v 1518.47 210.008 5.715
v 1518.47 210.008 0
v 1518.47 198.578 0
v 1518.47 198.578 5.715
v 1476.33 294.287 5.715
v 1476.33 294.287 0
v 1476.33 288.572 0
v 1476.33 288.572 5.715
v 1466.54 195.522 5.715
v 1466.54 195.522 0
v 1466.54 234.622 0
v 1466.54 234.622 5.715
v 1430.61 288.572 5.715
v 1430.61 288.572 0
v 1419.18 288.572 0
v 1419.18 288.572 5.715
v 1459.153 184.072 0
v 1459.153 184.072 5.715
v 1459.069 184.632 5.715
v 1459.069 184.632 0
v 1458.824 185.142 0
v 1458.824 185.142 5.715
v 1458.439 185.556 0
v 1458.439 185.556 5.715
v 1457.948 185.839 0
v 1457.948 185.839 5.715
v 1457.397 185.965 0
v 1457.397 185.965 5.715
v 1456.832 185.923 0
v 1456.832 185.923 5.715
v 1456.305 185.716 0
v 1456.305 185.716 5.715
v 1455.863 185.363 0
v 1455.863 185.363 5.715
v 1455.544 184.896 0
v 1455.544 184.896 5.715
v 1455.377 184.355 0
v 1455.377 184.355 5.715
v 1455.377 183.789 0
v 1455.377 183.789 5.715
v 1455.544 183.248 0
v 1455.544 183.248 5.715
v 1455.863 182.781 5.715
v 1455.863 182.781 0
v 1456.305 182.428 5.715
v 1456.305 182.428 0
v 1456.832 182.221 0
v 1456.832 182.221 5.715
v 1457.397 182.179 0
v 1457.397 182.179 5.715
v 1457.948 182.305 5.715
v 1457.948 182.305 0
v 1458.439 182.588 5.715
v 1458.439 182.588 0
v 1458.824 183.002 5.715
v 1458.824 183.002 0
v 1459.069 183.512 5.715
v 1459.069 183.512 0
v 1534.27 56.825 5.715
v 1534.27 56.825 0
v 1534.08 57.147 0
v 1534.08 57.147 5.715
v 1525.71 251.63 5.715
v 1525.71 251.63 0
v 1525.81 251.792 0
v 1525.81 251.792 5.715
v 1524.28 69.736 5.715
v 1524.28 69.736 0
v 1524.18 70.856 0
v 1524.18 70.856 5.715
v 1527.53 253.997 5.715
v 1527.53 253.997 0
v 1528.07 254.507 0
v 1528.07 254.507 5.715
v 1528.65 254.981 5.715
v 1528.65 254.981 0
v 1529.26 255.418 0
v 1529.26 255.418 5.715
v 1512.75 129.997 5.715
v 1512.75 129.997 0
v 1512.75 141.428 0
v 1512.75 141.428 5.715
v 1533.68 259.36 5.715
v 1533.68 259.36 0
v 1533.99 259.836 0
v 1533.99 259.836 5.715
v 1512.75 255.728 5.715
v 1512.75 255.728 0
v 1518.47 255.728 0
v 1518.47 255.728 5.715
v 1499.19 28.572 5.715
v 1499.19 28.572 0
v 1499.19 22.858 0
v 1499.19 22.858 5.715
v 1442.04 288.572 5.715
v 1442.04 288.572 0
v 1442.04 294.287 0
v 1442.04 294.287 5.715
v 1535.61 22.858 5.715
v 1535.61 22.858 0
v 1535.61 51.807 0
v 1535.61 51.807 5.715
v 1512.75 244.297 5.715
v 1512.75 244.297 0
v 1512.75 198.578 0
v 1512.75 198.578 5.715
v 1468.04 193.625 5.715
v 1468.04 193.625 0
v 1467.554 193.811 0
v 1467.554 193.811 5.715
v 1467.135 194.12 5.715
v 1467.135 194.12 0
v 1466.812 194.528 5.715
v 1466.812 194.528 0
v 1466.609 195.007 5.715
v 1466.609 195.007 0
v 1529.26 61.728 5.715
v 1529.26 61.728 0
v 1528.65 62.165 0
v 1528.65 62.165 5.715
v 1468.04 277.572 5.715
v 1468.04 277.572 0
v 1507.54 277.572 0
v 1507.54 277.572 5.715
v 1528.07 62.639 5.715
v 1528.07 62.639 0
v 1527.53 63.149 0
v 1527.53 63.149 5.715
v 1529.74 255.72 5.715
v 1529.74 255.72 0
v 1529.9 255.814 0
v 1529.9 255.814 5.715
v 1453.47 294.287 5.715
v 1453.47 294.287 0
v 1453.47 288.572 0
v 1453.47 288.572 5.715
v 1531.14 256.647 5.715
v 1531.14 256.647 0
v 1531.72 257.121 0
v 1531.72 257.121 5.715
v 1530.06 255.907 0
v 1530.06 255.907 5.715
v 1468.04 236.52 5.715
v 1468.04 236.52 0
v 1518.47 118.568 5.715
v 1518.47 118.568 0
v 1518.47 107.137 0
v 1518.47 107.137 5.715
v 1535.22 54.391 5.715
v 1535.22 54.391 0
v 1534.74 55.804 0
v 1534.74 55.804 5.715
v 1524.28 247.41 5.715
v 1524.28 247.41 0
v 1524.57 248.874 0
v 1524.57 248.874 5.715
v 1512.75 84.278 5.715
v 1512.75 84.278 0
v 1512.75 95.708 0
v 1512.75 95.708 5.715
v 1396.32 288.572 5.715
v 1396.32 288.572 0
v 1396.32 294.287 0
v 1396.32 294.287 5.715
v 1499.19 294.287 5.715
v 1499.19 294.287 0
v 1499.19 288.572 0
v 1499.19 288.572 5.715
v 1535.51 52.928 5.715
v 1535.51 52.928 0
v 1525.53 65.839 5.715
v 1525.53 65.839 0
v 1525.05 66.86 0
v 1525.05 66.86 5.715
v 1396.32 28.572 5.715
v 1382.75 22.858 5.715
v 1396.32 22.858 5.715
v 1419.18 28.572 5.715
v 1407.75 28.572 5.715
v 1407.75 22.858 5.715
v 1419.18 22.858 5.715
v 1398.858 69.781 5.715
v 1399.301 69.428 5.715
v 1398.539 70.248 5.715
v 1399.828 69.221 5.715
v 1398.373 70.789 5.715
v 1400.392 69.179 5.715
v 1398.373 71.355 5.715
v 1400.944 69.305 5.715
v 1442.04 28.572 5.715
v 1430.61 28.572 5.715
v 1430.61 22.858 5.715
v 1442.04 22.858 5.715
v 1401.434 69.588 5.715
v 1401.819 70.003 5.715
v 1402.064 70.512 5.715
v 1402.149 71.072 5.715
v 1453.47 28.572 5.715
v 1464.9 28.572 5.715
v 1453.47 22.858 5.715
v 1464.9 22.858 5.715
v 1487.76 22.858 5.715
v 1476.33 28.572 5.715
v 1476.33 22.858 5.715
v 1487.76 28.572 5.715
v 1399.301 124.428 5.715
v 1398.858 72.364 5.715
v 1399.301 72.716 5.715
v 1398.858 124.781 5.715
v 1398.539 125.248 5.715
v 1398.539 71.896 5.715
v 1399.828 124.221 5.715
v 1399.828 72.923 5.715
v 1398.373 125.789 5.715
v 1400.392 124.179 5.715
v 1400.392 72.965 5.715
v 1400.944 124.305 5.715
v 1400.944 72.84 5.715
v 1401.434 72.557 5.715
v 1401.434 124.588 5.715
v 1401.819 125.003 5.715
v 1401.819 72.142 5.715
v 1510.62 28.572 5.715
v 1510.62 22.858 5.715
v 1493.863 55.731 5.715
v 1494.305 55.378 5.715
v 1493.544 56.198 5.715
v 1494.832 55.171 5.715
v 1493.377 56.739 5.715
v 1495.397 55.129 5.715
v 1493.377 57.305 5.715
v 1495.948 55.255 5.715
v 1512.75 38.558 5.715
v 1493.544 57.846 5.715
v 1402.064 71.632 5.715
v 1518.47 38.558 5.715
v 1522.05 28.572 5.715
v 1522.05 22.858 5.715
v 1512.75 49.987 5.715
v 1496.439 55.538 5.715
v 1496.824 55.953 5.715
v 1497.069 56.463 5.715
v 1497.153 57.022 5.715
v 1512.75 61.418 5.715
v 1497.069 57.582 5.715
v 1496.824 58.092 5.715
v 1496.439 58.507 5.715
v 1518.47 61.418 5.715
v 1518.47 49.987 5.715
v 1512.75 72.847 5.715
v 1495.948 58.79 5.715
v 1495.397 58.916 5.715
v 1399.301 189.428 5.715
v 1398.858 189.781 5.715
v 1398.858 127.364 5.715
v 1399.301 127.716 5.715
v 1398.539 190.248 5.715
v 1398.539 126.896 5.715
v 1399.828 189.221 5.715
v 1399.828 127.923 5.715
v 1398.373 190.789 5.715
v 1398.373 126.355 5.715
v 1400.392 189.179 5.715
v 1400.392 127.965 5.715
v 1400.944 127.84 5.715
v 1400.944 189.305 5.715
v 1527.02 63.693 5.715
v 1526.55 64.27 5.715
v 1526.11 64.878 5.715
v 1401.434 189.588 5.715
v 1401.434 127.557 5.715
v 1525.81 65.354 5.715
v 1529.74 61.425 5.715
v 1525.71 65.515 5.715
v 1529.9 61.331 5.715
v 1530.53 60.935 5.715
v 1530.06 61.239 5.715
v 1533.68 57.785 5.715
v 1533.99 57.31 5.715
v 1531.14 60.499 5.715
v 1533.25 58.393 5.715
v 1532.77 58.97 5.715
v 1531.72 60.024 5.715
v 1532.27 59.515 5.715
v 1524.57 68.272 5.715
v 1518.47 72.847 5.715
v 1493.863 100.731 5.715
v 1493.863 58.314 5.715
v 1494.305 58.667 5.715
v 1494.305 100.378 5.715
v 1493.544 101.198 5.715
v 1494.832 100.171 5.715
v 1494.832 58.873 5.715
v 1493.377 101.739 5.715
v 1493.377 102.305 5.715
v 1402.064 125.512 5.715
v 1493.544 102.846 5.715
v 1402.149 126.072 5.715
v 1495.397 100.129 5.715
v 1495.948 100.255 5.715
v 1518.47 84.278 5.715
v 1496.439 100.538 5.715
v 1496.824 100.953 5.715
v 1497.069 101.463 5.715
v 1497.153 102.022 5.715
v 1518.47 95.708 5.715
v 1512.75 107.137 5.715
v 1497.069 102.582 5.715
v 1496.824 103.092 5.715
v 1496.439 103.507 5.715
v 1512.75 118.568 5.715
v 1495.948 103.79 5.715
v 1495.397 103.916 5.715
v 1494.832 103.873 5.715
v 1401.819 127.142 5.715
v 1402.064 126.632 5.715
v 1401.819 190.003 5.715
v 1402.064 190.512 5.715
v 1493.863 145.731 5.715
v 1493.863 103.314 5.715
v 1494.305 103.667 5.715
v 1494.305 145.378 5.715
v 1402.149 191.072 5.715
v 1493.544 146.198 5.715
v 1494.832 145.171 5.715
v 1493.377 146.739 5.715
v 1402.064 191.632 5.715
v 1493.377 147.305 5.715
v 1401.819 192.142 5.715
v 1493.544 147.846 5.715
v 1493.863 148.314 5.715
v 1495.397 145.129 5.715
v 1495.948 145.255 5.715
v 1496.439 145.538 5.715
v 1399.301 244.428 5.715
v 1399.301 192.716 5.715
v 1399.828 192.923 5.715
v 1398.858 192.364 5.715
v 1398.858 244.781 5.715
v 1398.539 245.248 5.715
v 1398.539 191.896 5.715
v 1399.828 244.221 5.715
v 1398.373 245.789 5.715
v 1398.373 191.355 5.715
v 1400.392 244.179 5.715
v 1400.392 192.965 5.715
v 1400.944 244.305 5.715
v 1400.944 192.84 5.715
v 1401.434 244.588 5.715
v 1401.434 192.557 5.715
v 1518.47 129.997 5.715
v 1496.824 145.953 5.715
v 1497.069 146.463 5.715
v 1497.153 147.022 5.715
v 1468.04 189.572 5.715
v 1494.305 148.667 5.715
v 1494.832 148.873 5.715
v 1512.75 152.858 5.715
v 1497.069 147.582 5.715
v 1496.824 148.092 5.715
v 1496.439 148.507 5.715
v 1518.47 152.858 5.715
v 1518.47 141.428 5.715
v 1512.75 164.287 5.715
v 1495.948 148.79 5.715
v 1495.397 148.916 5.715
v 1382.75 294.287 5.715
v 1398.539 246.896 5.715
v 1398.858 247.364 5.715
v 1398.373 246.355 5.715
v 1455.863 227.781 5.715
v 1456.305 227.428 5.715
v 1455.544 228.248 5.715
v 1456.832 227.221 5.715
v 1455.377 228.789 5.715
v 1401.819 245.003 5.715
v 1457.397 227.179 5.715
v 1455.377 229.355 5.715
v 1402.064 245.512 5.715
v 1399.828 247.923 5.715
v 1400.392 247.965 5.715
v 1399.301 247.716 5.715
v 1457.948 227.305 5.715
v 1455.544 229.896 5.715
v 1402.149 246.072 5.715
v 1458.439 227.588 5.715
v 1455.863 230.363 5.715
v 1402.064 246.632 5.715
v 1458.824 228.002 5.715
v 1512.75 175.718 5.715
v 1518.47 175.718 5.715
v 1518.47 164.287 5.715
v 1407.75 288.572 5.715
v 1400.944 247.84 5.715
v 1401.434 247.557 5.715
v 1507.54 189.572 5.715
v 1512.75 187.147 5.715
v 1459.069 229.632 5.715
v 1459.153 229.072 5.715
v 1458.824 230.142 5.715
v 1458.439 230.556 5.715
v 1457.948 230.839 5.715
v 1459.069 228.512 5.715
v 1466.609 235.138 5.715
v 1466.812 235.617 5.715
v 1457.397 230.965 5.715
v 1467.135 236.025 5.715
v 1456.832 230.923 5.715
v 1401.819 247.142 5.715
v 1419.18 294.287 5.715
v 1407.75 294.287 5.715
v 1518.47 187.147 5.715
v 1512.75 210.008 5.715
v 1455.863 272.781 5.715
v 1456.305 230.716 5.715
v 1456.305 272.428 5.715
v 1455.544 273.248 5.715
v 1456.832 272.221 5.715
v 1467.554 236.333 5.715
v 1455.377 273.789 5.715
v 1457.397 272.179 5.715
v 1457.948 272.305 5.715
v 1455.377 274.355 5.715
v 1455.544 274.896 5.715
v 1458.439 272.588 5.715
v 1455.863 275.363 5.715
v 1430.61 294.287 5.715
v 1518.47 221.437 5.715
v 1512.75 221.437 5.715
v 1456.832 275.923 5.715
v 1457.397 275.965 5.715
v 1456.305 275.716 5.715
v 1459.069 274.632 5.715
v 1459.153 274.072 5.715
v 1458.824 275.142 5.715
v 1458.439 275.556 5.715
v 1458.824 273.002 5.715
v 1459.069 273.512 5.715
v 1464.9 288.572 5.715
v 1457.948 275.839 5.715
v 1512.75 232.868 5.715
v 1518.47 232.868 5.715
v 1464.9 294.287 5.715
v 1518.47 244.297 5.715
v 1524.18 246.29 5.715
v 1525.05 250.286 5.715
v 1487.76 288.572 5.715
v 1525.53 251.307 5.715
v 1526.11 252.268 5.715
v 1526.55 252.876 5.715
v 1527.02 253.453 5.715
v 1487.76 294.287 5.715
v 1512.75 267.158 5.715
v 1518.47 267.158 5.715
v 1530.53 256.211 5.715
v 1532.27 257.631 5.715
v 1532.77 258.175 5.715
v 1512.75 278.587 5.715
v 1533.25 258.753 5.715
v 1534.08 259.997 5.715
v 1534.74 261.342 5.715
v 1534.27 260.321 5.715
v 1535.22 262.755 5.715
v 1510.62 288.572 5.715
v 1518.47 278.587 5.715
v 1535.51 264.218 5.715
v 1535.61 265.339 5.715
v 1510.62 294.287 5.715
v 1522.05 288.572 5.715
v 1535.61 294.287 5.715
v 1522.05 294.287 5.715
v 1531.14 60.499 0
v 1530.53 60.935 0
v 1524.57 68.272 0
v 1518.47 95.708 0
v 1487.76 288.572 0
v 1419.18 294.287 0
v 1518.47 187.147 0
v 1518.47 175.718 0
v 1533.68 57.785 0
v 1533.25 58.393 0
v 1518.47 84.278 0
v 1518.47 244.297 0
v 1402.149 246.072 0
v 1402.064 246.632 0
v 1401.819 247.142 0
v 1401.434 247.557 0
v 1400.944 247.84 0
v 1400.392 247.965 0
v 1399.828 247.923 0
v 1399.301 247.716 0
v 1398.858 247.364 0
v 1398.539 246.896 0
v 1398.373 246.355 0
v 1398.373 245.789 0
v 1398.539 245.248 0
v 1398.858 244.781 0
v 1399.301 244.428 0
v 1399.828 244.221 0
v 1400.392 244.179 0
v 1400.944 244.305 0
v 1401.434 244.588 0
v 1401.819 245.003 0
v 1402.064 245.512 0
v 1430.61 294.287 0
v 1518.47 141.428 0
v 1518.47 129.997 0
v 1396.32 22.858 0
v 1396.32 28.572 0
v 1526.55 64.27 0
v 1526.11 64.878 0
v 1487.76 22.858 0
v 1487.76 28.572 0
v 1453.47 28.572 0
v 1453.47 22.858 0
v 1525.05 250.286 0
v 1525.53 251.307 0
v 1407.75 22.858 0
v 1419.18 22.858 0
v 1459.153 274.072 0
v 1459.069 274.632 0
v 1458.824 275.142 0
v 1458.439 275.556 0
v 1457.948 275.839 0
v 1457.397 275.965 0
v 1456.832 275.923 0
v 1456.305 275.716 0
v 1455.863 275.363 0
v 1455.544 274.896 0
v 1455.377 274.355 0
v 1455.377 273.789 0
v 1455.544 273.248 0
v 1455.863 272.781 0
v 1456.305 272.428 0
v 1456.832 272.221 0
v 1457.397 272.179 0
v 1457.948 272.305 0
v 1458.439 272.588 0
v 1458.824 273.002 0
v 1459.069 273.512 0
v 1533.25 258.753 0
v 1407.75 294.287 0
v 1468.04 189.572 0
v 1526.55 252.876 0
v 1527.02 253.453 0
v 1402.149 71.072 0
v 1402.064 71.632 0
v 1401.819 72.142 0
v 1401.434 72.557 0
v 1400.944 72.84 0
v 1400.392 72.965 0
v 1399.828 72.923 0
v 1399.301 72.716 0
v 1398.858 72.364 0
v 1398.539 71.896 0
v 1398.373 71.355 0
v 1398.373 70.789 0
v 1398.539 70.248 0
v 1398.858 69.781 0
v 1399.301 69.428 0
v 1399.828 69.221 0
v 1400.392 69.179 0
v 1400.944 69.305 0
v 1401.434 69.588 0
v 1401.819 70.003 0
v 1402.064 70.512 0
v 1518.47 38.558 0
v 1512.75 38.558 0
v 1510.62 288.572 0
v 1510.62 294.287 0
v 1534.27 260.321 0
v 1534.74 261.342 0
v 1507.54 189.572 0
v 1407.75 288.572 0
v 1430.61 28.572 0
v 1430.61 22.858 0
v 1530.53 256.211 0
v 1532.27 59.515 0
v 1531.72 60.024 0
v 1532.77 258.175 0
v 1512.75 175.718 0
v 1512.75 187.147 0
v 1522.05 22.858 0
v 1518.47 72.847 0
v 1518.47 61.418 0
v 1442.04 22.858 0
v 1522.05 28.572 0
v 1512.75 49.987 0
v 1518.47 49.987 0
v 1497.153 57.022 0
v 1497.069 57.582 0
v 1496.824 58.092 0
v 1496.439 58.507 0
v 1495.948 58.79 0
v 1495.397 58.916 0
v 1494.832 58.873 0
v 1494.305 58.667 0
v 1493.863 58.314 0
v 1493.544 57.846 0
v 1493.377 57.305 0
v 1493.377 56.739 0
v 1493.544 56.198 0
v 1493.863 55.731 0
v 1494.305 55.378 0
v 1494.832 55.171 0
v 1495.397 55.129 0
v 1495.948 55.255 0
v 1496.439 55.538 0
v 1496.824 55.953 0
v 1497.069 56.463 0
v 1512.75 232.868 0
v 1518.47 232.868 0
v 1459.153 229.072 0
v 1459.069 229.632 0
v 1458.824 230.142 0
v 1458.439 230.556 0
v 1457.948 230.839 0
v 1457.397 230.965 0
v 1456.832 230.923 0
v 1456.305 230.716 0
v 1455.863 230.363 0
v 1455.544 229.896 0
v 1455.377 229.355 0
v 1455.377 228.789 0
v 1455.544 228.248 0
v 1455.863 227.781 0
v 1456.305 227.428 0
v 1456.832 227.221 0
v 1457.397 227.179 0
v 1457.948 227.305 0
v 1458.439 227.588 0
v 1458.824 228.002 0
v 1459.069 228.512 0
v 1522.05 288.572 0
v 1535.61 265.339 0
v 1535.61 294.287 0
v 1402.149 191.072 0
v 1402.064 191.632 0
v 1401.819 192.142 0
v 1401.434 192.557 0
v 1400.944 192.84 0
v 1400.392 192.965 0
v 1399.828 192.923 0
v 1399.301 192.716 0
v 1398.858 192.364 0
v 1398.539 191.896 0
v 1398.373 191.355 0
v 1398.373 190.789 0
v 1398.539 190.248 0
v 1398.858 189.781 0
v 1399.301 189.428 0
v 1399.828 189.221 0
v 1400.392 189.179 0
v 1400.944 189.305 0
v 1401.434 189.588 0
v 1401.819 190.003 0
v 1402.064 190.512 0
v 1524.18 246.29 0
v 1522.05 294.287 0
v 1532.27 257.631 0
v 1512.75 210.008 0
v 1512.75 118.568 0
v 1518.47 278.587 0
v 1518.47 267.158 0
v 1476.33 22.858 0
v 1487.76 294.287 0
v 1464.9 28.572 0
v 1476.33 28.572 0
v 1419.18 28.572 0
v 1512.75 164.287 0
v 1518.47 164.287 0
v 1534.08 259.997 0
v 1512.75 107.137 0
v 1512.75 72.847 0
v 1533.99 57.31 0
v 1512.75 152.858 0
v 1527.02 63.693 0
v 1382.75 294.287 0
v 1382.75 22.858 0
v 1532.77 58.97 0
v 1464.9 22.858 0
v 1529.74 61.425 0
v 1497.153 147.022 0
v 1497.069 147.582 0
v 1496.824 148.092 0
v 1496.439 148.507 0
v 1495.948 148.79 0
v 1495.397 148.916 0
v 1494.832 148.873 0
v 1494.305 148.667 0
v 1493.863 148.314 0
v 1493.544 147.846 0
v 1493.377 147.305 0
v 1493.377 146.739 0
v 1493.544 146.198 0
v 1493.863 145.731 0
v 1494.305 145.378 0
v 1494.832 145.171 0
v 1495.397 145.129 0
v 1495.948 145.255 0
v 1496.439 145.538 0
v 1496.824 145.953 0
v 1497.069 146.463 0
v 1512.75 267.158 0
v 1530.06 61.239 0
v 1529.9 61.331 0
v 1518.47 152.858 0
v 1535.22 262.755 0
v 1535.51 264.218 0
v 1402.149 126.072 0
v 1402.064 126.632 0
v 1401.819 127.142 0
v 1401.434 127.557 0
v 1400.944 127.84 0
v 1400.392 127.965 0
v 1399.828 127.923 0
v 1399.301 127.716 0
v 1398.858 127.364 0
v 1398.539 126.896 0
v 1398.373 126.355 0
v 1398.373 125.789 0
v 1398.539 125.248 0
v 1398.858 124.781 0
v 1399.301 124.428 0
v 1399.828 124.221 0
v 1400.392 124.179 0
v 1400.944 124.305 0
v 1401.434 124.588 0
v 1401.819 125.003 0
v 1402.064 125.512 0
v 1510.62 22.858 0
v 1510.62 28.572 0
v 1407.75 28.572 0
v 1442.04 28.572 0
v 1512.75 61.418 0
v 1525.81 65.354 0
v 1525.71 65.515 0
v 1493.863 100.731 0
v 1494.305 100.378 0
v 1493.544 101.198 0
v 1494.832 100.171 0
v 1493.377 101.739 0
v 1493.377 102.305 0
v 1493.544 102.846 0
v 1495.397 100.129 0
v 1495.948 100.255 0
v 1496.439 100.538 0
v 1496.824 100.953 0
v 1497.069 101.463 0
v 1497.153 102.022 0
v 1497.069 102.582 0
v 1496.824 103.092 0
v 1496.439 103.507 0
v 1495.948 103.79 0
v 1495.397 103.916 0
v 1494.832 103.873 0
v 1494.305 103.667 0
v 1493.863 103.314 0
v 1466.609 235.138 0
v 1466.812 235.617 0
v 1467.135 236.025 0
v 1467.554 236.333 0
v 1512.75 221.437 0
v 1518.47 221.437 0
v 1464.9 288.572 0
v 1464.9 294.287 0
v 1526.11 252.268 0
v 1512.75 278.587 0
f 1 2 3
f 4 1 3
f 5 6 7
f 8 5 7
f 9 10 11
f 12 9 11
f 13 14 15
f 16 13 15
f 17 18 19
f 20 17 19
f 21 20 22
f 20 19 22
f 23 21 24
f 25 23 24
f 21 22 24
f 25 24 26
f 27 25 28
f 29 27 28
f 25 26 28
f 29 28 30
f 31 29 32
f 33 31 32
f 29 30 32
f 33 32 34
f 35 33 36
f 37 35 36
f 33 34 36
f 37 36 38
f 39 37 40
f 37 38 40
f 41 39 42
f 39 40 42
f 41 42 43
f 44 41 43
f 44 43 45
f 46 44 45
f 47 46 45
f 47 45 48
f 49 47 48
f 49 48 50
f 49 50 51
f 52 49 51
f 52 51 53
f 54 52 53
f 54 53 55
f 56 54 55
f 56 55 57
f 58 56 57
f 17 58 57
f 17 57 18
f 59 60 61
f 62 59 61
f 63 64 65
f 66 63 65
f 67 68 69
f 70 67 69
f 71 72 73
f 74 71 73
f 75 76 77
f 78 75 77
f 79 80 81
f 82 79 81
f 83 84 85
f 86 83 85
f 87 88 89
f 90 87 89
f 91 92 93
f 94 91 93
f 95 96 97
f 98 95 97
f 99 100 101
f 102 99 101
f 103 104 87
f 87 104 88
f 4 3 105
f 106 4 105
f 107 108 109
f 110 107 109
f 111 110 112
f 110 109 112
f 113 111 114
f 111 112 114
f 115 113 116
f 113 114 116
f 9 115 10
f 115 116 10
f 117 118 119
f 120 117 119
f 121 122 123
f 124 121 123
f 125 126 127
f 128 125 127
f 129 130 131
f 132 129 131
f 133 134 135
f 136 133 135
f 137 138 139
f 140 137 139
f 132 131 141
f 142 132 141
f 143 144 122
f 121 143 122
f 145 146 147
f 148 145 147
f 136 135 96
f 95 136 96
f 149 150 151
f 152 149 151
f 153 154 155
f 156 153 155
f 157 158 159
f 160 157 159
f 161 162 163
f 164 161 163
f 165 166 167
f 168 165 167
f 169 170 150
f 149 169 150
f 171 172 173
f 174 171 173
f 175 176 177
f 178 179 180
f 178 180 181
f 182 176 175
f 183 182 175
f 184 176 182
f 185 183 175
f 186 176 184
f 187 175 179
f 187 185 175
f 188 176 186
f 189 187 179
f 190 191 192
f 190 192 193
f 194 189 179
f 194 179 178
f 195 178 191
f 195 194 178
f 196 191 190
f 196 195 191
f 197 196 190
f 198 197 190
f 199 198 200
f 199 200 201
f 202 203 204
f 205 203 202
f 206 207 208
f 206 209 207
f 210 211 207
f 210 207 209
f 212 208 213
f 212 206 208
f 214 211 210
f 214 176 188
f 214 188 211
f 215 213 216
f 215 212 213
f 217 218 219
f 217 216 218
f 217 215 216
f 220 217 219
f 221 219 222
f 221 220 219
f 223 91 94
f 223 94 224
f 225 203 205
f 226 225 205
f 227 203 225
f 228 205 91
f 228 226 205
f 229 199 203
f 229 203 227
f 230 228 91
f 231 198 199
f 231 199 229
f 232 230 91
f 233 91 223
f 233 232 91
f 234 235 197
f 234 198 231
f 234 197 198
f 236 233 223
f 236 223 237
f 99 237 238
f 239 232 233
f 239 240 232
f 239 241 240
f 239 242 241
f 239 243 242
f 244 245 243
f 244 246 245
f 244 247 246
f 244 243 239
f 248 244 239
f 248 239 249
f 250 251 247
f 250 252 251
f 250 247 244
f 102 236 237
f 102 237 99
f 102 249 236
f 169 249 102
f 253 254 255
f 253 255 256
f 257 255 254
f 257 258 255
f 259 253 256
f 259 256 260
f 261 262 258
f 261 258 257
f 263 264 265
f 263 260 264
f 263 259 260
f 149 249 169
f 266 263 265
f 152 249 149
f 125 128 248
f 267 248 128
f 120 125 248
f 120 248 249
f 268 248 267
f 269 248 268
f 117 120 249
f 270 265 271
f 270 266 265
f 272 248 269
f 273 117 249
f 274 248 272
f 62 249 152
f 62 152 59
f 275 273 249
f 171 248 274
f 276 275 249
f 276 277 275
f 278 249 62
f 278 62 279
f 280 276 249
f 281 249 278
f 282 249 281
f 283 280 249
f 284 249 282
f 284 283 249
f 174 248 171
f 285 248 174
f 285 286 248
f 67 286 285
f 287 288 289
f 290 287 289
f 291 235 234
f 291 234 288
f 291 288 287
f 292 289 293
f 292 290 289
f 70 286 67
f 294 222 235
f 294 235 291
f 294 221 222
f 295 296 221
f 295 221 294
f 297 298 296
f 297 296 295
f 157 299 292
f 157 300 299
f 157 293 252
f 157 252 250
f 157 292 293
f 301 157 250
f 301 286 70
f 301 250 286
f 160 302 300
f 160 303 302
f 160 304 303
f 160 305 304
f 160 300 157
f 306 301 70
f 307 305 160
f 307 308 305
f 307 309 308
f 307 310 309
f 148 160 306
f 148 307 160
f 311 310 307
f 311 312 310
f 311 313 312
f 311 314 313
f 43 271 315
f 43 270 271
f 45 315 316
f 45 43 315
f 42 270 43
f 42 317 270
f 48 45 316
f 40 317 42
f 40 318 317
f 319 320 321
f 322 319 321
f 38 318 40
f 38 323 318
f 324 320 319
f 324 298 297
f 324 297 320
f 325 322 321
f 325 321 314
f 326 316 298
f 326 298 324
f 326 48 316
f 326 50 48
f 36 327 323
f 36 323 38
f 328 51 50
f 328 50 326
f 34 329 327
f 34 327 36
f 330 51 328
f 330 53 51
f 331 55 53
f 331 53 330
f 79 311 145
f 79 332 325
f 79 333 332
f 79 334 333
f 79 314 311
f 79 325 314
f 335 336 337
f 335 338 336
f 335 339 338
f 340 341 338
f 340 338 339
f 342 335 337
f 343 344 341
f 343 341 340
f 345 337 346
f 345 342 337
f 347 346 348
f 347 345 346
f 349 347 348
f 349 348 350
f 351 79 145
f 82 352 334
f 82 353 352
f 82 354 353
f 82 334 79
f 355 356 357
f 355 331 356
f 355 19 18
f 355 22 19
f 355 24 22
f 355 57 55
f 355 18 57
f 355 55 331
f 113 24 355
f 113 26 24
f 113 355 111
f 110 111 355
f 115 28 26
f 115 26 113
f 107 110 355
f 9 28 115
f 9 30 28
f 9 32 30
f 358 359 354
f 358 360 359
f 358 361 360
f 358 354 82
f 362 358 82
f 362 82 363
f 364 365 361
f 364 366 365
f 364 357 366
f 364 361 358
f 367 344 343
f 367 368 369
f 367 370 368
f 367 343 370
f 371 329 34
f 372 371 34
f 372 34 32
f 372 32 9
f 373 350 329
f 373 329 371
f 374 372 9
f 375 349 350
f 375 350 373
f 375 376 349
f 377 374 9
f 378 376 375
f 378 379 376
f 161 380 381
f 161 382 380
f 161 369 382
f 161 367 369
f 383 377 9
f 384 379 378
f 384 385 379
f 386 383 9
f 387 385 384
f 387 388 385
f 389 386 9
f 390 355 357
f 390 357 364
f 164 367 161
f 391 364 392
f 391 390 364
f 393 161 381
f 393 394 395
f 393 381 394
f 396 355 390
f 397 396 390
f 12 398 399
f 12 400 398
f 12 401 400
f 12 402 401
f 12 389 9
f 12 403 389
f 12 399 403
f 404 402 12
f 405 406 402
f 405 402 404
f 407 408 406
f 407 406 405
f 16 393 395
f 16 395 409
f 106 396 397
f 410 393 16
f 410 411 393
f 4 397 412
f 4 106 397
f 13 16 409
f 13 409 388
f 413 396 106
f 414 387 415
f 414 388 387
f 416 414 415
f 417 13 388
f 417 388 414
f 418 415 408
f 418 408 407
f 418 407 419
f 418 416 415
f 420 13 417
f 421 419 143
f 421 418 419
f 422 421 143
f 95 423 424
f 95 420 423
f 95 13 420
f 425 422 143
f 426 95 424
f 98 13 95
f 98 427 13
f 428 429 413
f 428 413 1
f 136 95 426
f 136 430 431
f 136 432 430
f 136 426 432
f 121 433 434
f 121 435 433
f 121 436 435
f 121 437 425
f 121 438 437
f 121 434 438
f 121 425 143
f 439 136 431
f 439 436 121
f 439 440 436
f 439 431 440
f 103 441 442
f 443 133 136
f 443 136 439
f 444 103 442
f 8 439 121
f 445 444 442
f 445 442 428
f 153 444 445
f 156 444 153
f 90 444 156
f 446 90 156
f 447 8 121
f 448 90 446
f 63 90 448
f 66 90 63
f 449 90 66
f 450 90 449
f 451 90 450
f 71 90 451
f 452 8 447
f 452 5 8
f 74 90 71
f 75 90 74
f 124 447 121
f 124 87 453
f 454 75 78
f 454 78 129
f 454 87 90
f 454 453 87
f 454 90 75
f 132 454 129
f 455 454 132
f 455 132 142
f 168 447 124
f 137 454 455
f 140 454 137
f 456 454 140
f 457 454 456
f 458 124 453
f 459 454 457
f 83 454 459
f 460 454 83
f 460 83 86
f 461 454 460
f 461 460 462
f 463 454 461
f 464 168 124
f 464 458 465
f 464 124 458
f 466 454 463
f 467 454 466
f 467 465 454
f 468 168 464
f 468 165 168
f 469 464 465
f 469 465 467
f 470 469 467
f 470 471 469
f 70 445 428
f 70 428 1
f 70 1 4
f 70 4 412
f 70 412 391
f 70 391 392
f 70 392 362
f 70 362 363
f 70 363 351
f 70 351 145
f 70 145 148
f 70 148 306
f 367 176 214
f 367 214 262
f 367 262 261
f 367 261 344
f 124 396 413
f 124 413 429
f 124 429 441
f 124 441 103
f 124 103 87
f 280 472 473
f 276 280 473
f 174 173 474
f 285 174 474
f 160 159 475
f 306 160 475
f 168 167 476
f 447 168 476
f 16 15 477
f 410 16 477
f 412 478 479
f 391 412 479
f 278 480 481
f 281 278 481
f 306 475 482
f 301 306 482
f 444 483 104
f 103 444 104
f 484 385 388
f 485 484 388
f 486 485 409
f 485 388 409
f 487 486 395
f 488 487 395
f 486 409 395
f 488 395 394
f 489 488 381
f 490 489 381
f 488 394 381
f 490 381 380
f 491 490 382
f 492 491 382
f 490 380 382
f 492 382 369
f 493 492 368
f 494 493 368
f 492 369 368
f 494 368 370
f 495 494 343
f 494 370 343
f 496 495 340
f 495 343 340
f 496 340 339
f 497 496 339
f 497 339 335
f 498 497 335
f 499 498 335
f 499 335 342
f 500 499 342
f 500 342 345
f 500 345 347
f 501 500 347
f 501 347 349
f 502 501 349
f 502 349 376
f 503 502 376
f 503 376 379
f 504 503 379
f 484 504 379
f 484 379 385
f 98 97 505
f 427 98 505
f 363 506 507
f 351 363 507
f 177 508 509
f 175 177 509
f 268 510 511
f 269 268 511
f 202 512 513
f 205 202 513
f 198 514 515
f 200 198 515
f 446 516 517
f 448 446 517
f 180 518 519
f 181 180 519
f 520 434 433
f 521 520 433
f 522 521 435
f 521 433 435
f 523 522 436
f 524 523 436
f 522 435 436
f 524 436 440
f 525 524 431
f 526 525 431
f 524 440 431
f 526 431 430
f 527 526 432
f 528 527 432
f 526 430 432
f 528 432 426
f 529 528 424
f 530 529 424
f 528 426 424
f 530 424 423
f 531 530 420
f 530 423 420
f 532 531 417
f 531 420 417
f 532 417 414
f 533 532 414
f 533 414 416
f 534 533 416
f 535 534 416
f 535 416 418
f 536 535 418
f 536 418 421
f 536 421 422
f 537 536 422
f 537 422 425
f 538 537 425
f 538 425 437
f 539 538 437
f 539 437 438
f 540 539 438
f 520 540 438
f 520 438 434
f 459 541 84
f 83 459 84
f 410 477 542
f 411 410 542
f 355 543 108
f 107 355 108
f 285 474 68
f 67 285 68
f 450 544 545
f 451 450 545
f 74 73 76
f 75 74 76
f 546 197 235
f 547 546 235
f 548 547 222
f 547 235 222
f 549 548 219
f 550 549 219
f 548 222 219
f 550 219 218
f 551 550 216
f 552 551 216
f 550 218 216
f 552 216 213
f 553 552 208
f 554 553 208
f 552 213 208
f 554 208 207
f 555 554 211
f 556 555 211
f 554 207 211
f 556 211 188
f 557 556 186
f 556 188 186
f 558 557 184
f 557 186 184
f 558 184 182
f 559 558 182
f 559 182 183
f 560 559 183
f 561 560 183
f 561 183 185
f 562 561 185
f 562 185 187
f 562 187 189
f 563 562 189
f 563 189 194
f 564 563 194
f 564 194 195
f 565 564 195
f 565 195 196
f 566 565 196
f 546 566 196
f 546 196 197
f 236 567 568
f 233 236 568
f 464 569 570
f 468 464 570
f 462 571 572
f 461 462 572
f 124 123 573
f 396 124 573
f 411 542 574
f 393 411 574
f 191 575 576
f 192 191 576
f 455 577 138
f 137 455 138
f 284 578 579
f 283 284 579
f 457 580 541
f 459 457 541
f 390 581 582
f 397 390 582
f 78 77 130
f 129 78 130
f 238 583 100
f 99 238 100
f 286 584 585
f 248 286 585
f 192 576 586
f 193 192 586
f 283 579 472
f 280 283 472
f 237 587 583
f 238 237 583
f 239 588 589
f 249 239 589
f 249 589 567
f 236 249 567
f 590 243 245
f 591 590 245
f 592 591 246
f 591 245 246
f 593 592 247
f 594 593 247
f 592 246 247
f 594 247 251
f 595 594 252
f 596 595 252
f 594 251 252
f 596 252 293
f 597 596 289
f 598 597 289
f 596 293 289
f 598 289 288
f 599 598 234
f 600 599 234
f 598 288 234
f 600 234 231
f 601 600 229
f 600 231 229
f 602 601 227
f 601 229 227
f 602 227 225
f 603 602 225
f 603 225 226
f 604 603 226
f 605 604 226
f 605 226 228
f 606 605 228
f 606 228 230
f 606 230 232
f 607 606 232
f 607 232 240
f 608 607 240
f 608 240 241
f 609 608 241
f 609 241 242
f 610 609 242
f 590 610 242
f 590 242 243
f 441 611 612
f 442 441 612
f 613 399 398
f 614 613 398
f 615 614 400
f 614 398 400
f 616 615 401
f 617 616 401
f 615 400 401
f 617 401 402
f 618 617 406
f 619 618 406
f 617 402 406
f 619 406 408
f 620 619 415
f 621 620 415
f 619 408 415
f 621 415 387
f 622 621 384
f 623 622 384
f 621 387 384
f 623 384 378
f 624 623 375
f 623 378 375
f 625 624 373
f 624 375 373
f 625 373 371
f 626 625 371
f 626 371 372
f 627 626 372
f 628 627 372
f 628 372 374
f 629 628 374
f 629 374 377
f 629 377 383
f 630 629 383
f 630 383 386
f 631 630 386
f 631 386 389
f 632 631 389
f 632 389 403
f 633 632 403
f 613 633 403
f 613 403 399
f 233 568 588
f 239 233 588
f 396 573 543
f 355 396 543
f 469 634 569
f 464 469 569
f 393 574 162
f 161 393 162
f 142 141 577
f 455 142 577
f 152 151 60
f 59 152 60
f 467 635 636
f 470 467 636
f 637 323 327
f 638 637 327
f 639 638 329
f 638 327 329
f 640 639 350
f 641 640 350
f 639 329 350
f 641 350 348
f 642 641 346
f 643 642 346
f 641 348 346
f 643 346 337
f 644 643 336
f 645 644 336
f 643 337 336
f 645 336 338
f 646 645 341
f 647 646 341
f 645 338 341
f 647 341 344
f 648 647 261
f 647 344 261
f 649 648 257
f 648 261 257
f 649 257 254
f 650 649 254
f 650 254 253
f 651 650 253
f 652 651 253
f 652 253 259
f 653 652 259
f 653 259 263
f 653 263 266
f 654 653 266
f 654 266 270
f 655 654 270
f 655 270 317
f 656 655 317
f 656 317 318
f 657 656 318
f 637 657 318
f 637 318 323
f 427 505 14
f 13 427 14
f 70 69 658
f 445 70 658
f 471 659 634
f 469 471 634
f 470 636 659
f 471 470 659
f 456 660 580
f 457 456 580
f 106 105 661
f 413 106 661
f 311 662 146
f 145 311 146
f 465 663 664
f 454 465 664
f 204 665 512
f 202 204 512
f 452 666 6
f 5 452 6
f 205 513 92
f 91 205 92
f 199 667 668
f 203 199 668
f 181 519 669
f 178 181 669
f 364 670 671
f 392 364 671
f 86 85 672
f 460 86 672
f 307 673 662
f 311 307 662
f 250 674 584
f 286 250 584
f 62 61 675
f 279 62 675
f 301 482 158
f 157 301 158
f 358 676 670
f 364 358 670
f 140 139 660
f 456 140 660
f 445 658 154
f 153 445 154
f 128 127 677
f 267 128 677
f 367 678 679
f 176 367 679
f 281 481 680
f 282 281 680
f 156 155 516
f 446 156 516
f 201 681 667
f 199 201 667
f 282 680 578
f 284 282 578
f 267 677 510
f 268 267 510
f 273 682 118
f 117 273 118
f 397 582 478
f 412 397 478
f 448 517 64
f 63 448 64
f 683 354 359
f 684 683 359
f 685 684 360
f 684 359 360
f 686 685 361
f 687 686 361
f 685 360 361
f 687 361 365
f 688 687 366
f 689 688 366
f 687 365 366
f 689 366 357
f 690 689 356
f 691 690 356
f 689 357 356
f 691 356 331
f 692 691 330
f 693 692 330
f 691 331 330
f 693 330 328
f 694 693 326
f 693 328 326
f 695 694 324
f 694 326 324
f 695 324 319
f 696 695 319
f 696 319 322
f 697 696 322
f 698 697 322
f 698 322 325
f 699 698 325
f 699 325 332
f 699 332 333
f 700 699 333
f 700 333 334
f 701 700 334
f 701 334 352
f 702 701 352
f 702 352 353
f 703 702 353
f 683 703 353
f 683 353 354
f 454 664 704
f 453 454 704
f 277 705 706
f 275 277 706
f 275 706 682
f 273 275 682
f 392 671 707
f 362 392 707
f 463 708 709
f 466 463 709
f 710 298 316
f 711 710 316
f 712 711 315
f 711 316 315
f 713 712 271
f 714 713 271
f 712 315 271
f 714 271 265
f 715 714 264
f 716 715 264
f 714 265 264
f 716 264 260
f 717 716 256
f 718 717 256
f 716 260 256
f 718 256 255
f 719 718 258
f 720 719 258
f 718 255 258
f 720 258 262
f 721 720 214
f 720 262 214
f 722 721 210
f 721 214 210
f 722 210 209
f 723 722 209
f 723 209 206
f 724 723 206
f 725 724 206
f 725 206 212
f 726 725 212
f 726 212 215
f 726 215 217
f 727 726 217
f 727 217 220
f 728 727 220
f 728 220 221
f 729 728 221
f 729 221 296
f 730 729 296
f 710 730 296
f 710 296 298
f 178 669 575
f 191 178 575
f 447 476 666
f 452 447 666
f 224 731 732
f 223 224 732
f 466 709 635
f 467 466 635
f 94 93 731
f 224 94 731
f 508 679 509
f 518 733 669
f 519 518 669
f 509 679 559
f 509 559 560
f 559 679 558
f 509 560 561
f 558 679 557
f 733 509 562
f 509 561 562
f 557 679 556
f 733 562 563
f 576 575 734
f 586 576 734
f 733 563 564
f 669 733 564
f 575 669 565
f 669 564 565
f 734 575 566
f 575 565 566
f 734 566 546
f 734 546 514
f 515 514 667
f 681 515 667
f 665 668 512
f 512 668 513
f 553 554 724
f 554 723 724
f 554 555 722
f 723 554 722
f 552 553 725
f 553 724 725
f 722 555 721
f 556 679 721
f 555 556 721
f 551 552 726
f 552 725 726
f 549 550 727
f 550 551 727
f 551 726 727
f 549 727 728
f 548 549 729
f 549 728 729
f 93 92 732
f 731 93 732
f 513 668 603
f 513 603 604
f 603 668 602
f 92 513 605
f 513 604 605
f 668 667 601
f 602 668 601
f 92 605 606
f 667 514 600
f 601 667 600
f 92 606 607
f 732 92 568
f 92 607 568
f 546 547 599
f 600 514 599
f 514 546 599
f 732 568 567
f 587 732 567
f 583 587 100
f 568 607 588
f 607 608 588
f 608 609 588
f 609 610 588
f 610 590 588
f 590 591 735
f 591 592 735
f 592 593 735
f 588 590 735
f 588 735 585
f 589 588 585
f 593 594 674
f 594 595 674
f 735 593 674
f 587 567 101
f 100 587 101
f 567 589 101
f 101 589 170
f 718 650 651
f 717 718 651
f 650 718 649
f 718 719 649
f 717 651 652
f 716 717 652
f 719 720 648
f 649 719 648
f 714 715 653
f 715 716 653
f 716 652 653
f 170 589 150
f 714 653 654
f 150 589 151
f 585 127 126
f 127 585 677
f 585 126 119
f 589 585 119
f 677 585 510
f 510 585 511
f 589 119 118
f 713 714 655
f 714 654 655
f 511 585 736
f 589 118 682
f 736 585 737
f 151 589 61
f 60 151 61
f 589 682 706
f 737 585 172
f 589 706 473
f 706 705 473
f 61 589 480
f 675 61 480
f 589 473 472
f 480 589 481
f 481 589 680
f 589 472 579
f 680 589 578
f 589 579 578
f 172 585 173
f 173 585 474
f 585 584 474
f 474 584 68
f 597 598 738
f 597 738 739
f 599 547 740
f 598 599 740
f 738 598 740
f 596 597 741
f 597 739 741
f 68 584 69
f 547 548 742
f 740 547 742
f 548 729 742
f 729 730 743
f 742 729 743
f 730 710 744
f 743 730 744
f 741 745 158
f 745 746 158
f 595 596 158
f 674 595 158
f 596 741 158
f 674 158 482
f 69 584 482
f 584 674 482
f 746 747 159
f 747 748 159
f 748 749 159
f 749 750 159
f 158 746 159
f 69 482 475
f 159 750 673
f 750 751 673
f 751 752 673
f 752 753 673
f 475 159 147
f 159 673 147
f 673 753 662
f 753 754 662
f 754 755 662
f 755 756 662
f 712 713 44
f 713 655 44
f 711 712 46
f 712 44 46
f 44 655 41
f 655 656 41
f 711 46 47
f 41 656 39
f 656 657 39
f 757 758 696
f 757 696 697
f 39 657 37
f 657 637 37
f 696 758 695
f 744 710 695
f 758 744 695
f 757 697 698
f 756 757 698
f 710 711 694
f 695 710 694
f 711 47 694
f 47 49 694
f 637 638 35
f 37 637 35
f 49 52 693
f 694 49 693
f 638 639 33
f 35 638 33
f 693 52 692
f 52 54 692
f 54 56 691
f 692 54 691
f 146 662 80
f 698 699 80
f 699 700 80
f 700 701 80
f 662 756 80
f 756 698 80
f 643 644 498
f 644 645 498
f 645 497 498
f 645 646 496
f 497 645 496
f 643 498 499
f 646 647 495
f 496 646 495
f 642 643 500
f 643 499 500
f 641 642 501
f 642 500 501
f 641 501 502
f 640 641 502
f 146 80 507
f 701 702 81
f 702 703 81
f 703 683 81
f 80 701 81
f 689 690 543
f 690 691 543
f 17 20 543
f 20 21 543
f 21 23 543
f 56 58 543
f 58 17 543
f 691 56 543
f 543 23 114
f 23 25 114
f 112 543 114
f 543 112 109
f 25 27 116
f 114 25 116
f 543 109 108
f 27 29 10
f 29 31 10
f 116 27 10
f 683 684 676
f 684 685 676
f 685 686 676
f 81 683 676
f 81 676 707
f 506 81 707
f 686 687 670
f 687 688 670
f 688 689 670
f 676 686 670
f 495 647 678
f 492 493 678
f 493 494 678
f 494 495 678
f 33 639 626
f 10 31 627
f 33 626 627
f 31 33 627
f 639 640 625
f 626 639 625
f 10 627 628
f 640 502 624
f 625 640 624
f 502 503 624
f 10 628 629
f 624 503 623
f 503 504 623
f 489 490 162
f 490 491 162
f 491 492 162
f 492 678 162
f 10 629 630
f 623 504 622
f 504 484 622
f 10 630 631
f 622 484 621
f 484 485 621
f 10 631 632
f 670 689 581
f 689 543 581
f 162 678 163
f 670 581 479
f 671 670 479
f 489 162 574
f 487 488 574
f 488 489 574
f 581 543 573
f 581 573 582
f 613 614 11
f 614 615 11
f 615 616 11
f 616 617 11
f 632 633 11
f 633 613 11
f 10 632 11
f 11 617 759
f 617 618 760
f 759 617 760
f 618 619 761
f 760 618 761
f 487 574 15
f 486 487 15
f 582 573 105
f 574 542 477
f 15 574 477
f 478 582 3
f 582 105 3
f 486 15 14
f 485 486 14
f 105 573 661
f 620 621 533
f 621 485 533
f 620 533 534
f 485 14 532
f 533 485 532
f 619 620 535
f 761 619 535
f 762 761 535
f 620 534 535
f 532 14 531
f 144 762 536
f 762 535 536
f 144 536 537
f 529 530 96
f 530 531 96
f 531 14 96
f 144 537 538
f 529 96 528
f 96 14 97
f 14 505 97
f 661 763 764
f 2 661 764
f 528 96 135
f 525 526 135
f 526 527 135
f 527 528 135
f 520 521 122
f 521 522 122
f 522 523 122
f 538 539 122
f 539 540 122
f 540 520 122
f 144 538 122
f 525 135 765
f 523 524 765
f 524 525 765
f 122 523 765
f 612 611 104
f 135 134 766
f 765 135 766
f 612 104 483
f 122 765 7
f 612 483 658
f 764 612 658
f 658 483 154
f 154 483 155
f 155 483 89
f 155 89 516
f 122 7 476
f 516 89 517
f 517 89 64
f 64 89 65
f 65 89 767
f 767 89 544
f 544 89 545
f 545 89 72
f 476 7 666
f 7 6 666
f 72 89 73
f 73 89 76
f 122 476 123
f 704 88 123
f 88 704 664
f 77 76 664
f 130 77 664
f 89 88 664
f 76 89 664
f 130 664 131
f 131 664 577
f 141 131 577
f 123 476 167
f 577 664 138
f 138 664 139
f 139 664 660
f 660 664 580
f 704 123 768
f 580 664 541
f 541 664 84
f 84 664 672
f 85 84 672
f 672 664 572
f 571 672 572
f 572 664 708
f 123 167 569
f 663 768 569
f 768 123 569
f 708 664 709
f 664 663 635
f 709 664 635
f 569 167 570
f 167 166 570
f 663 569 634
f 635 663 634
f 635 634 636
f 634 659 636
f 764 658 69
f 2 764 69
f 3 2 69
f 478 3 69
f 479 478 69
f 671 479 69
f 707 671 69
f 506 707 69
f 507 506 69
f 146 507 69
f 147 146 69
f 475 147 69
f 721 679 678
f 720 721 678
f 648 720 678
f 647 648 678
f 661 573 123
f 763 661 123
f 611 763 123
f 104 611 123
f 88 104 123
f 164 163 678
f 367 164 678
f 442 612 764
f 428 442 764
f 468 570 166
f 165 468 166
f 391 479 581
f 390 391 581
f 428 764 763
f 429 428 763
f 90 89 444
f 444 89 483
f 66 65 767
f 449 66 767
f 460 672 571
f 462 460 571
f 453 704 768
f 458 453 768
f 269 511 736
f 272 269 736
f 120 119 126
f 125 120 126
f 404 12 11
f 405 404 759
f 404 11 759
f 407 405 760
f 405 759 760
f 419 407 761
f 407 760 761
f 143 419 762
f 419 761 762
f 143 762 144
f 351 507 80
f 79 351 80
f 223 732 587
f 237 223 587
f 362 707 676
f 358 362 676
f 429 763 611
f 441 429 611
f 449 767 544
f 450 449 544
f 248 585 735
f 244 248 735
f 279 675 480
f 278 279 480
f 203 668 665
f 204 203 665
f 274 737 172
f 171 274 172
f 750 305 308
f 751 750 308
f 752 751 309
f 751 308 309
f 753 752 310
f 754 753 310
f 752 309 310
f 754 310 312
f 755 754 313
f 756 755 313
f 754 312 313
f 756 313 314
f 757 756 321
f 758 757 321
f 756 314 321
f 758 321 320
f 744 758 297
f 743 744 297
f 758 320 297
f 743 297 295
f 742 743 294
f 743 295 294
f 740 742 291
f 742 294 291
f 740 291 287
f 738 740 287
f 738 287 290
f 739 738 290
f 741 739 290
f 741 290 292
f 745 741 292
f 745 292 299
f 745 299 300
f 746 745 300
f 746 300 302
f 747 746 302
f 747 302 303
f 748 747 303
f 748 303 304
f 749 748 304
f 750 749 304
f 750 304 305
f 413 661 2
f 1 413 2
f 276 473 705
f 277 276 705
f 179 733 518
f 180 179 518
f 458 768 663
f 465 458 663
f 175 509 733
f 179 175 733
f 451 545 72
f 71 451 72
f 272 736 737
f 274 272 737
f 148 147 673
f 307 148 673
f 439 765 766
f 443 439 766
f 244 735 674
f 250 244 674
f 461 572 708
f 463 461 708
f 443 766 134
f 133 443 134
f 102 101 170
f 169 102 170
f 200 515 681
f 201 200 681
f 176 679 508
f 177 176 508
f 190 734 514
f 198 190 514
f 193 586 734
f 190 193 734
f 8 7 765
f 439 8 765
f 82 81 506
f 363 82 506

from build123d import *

# Parameters (mm, degrees)
BOSS_EXTRUDE1_DEPTH   = 5.715
CUT_EXTRUDE1_DEPTH    = 6.715
F_6_CLEARANCE_HOLE1_D = 3.7973


with BuildPart() as part:
    # Model → Boss-Extrude1 (new body)
    with BuildSketch(Plane.XY):
        Polygon((1382.75, 22.8575), (1396.32, 22.8575), (1396.32, 28.5722), (1407.75, 28.5722), (1407.75, 22.8575), (1419.18, 22.8575), (1419.18, 28.5722), (1430.61, 28.5722), (1430.61, 22.8575), (1442.04, 22.8575), (1442.04, 28.5722), (1453.47, 28.5722), (1453.47, 22.8575), (1464.9, 22.8575), (1464.9, 28.5722), (1476.33, 28.5722), (1476.33, 22.8575), (1487.76, 22.8575), (1487.76, 28.5722), (1499.19, 28.5722), (1499.19, 22.8575), (1510.62, 22.8575), (1510.62, 28.5722), (1522.05, 28.5722), (1522.05, 22.8575), (1535.61, 22.8575), (1535.61, 28.5722), (1535.61, 51.4325), (1535.61, 51.8072), (1535.51, 52.9276), (1535.22, 54.3913), (1534.74, 55.8038), (1534.27, 56.8247), (1534.08, 57.1472), (1533.99, 57.3098), (1533.68, 57.7854), (1533.25, 58.3928), (1532.77, 58.9703), (1532.27, 59.5147), (1531.72, 60.0244), (1531.14, 60.4986), (1530.53, 60.9353), (1530.06, 61.2387), (1529.9, 61.3311), (1529.74, 61.4246), (1529.26, 61.728), (1528.65, 62.1647), (1528.07, 62.6389), (1527.53, 63.1486), (1527.02, 63.693), (1526.55, 64.2705), (1526.11, 64.878), (1525.81, 65.3535), (1525.71, 65.5147), (1525.53, 65.8386), (1525.05, 66.8595), (1524.57, 68.272), (1524.28, 69.7357), (1524.18, 70.8561), (1524.18, 71.2294), (1524.18, 245.915), (1524.18, 246.29), (1524.28, 247.41), (1524.57, 248.874), (1525.05, 250.286), (1525.53, 251.307), (1525.71, 251.63), (1525.81, 251.792), (1526.11, 252.268), (1526.55, 252.876), (1527.02, 253.453), (1527.53, 253.997), (1528.07, 254.507), (1528.65, 254.981), (1529.26, 255.418), (1529.74, 255.72), (1529.9, 255.814), (1530.06, 255.907), (1530.53, 256.211), (1531.14, 256.647), (1531.72, 257.121), (1532.27, 257.631), (1532.77, 258.175), (1533.25, 258.753), (1533.68, 259.36), (1533.99, 259.836), (1534.08, 259.997), (1534.27, 260.321), (1534.74, 261.342), (1535.22, 262.755), (1535.51, 264.218), (1535.61, 265.339), (1535.61, 265.712), (1535.61, 288.572), (1535.61, 294.287), (1522.05, 294.287), (1522.05, 288.572), (1510.62, 288.572), (1510.62, 294.287), (1499.19, 294.287), (1499.19, 288.572), (1487.76, 288.572), (1487.76, 294.287), (1476.33, 294.287), (1476.33, 288.572), (1464.9, 288.572), (1464.9, 294.287), (1453.47, 294.287), (1453.47, 288.572), (1442.04, 288.572), (1442.04, 294.287), (1430.61, 294.287), (1430.61, 288.572), (1419.18, 288.572), (1419.18, 294.287), (1407.75, 294.287), (1407.75, 288.572), (1396.32, 288.572), (1396.32, 294.287), (1382.75, 294.287), (1382.75, 288.572), (1382.75, 28.5722), align=None)
        Polygon((1518.47, 44.2722), (1518.47, 38.5576), (1512.75, 38.5576), (1512.75, 49.9868), (1518.47, 49.9868), align=None, mode=Mode.SUBTRACT)
        Polygon((1518.47, 67.1326), (1518.47, 61.4179), (1512.75, 61.4179), (1512.75, 72.8472), (1518.47, 72.8472), align=None, mode=Mode.SUBTRACT)
        Polygon((1518.47, 89.9929), (1518.47, 84.2779), (1512.75, 84.2779), (1512.75, 95.7076), (1518.47, 95.7076), align=None, mode=Mode.SUBTRACT)
        Polygon((1518.47, 112.853), (1518.47, 107.137), (1512.75, 107.137), (1512.75, 118.568), (1518.47, 118.568), align=None, mode=Mode.SUBTRACT)
        Polygon((1518.47, 135.712), (1518.47, 129.997), (1512.75, 129.997), (1512.75, 141.428), (1518.47, 141.428), align=None, mode=Mode.SUBTRACT)
        Polygon((1518.47, 158.572), (1518.47, 152.858), (1512.75, 152.858), (1512.75, 164.287), (1518.47, 164.287), align=None, mode=Mode.SUBTRACT)
        Polygon((1518.47, 181.433), (1518.47, 175.718), (1512.75, 175.718), (1512.75, 187.147), (1518.47, 187.147), align=None, mode=Mode.SUBTRACT)
        Polygon((1518.47, 204.293), (1518.47, 198.578), (1512.75, 198.578), (1512.75, 210.008), (1518.47, 210.008), align=None, mode=Mode.SUBTRACT)
        Polygon((1518.47, 227.153), (1518.47, 221.437), (1512.75, 221.437), (1512.75, 232.868), (1518.47, 232.868), align=None, mode=Mode.SUBTRACT)
        Polygon((1518.47, 250.012), (1518.47, 244.297), (1512.75, 244.297), (1512.75, 255.728), (1518.47, 255.728), align=None, mode=Mode.SUBTRACT)
        Polygon((1518.47, 272.872), (1518.47, 267.158), (1512.75, 267.158), (1512.75, 278.587), (1518.47, 278.587), align=None, mode=Mode.SUBTRACT)
    extrude(amount=BOSS_EXTRUDE1_DEPTH)

    # Sketch1 → Cut-Extrude1 (cut, through all)
    with BuildSketch(Plane(origin=(0, 0, 0), x_dir=(-1, 0, 0), z_dir=(0, 0, -1))):
        with BuildLine():
            Line((-1468.0398, 277.5723), (-1507.5398, 277.5723))
            Line((-1507.5398, 277.5723), (-1507.5398, 189.5723))
            Line((-1507.5398, 189.5723), (-1468.0398, 189.5723))
            Line((-1468.0398, 189.5723), (-1468.0398, 193.624933404))
            ThreePointArc((-1468.0398, 193.624933404), (-1466.960094146, 194.312961338), (-1466.5398, 195.5223))
            Line((-1466.5398, 195.5223), (-1466.5398, 234.6223))
            ThreePointArc((-1466.5398, 234.6223), (-1466.960094146, 235.831638662), (-1468.0398, 236.519666596))
            Line((-1468.0398, 236.519666596), (-1468.0398, 277.5723))
        make_face()
    extrude(amount=-CUT_EXTRUDE1_DEPTH, mode=Mode.SUBTRACT)

    # #6 Clearance Hole1 (through all)
    with Locations(Plane(origin=(0, 0, 0), x_dir=(-1, 0, 0), z_dir=(0, 0, -1))):
        with Locations((-1400.25, 246.0721), (-1400.25, 191.0721), (-1400.25, 126.0721), (-1400.25, 71.0721), (-1457.2548, 274.072), (-1457.2548, 229.072), (-1457.2548, 184.072), (-1495.2548, 147.02225), (-1495.2548, 102.02225), (-1495.2548, 57.02225)):
            Hole(F_6_CLEARANCE_HOLE1_D / 2)


solid = part.part
